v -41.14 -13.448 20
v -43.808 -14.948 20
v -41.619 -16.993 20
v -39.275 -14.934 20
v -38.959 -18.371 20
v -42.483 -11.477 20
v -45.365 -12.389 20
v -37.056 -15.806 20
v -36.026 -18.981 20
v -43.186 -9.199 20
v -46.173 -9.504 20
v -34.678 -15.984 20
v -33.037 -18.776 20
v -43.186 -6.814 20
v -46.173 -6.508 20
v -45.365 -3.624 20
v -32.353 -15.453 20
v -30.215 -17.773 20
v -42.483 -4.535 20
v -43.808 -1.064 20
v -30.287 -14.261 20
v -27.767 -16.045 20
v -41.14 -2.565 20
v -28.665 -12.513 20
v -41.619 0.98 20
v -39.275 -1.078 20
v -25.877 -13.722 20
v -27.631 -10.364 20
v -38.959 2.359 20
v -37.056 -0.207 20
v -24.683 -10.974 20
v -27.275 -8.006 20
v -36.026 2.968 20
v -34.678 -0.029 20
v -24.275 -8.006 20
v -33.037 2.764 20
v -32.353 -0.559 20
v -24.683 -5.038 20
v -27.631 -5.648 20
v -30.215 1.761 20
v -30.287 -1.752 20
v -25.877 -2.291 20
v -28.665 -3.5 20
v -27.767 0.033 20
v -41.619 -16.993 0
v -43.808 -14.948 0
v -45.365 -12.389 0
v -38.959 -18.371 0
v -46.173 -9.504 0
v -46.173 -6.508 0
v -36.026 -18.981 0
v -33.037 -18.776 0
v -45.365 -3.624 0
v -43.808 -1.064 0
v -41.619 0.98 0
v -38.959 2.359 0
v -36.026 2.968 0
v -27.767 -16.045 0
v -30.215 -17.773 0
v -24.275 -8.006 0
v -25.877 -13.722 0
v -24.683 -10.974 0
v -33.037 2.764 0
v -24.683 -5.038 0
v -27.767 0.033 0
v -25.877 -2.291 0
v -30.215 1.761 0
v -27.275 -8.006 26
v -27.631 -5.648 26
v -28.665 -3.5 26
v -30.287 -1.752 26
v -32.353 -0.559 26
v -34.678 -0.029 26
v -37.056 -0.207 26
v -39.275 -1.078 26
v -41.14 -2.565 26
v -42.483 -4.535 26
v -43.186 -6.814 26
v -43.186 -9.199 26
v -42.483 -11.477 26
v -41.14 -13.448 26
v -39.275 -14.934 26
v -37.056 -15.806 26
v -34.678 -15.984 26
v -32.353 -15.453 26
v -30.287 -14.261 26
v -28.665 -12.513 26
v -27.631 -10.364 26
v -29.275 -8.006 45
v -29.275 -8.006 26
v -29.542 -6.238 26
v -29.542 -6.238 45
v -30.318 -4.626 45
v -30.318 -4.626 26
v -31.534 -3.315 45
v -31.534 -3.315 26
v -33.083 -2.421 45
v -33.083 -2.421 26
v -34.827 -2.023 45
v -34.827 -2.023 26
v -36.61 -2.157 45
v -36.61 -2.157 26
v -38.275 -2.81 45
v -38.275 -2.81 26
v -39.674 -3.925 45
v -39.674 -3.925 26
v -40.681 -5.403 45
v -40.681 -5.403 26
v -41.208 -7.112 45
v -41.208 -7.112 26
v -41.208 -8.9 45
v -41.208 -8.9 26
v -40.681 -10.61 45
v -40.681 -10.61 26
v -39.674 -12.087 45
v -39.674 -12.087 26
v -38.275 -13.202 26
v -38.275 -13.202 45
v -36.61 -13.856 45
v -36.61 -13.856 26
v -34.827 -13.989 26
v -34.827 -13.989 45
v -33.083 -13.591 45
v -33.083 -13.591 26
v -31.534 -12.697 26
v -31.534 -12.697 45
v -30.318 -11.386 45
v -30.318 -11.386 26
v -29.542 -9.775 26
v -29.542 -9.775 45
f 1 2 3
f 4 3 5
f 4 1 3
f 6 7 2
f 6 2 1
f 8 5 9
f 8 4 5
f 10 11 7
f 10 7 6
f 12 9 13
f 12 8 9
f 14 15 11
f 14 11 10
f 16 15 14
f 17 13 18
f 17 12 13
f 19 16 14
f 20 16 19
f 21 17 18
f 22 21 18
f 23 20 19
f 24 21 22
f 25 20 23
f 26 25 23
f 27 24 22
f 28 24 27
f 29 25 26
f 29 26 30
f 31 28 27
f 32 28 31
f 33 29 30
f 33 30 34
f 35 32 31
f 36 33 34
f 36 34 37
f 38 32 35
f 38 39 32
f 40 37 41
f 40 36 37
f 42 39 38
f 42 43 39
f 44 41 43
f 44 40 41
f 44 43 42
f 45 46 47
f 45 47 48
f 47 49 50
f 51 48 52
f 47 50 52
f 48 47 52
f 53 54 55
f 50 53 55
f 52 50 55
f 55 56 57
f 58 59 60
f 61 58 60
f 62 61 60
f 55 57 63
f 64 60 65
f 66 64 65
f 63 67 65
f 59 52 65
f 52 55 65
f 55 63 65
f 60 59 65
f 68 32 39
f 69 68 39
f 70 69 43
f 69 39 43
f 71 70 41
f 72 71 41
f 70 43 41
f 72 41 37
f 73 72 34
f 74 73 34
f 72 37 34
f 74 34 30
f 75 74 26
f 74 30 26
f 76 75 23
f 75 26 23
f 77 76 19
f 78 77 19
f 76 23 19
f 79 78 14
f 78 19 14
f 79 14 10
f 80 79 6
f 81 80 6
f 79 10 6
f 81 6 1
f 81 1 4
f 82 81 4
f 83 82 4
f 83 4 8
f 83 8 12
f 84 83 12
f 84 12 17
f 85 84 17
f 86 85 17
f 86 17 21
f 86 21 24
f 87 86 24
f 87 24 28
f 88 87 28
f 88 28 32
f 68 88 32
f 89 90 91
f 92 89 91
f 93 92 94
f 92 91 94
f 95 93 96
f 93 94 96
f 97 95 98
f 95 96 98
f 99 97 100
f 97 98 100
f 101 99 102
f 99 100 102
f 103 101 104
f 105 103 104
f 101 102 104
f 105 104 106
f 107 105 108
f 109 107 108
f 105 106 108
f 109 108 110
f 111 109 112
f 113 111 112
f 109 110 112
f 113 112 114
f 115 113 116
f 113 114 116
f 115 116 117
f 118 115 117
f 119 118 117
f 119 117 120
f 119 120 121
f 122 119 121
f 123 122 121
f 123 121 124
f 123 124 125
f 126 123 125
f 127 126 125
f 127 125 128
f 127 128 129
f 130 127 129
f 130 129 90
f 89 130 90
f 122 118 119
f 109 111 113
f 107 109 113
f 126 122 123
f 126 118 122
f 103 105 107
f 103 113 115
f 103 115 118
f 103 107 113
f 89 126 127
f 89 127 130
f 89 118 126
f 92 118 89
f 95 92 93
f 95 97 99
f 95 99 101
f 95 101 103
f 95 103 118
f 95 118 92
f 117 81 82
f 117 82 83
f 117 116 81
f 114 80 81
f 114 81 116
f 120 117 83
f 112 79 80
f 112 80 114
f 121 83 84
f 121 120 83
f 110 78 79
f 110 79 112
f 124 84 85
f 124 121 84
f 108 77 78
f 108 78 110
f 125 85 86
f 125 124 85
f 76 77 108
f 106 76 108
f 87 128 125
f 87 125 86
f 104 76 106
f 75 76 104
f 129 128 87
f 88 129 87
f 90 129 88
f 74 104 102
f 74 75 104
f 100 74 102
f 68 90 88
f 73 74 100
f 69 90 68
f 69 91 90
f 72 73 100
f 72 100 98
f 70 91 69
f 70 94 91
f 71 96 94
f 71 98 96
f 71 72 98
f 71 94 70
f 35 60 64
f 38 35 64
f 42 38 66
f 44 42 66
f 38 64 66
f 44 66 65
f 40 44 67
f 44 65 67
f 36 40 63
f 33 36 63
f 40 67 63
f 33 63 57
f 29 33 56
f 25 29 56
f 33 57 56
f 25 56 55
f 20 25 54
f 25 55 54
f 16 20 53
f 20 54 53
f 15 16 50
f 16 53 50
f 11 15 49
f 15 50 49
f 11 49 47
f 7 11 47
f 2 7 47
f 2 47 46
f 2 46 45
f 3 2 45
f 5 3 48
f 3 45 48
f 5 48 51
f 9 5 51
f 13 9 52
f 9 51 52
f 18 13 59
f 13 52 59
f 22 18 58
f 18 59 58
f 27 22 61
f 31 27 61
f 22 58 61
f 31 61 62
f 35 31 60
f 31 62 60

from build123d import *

# Parameters (mm, degrees)
F0_R     = 6
F1_DEPTH = 45
F0_R_2   = 8
F2_DEPTH = 26
F0_R_3   = 11
F3_DEPTH = 20


with BuildPart() as f1:
    # F0 (on Top) → F1 (new body)
    with BuildSketch(Plane.XY):
        with Locations((-35.2753475308, -8.006202057)):
            Circle(F0_R)
    extrude(amount=F1_DEPTH)

    # F0 (on Top) → F2 (join)
    with BuildSketch(Plane.XY):
        with Locations((-35.2753475308, -8.006202057)):
            Circle(F0_R_2)
        with Locations((-35.2753475308, -8.006202057)):
            Circle(F0_R, mode=Mode.SUBTRACT)
    extrude(amount=F2_DEPTH)

    # F0 (on Top) → F3 (join)
    with BuildSketch(Plane.XY):
        with Locations((-35.2753475308, -8.006202057)):
            Circle(F0_R_3)
        with Locations((-35.2753475308, -8.006202057)):
            Circle(F0_R_2, mode=Mode.SUBTRACT)
    extrude(amount=F3_DEPTH)


solid = f1.part
